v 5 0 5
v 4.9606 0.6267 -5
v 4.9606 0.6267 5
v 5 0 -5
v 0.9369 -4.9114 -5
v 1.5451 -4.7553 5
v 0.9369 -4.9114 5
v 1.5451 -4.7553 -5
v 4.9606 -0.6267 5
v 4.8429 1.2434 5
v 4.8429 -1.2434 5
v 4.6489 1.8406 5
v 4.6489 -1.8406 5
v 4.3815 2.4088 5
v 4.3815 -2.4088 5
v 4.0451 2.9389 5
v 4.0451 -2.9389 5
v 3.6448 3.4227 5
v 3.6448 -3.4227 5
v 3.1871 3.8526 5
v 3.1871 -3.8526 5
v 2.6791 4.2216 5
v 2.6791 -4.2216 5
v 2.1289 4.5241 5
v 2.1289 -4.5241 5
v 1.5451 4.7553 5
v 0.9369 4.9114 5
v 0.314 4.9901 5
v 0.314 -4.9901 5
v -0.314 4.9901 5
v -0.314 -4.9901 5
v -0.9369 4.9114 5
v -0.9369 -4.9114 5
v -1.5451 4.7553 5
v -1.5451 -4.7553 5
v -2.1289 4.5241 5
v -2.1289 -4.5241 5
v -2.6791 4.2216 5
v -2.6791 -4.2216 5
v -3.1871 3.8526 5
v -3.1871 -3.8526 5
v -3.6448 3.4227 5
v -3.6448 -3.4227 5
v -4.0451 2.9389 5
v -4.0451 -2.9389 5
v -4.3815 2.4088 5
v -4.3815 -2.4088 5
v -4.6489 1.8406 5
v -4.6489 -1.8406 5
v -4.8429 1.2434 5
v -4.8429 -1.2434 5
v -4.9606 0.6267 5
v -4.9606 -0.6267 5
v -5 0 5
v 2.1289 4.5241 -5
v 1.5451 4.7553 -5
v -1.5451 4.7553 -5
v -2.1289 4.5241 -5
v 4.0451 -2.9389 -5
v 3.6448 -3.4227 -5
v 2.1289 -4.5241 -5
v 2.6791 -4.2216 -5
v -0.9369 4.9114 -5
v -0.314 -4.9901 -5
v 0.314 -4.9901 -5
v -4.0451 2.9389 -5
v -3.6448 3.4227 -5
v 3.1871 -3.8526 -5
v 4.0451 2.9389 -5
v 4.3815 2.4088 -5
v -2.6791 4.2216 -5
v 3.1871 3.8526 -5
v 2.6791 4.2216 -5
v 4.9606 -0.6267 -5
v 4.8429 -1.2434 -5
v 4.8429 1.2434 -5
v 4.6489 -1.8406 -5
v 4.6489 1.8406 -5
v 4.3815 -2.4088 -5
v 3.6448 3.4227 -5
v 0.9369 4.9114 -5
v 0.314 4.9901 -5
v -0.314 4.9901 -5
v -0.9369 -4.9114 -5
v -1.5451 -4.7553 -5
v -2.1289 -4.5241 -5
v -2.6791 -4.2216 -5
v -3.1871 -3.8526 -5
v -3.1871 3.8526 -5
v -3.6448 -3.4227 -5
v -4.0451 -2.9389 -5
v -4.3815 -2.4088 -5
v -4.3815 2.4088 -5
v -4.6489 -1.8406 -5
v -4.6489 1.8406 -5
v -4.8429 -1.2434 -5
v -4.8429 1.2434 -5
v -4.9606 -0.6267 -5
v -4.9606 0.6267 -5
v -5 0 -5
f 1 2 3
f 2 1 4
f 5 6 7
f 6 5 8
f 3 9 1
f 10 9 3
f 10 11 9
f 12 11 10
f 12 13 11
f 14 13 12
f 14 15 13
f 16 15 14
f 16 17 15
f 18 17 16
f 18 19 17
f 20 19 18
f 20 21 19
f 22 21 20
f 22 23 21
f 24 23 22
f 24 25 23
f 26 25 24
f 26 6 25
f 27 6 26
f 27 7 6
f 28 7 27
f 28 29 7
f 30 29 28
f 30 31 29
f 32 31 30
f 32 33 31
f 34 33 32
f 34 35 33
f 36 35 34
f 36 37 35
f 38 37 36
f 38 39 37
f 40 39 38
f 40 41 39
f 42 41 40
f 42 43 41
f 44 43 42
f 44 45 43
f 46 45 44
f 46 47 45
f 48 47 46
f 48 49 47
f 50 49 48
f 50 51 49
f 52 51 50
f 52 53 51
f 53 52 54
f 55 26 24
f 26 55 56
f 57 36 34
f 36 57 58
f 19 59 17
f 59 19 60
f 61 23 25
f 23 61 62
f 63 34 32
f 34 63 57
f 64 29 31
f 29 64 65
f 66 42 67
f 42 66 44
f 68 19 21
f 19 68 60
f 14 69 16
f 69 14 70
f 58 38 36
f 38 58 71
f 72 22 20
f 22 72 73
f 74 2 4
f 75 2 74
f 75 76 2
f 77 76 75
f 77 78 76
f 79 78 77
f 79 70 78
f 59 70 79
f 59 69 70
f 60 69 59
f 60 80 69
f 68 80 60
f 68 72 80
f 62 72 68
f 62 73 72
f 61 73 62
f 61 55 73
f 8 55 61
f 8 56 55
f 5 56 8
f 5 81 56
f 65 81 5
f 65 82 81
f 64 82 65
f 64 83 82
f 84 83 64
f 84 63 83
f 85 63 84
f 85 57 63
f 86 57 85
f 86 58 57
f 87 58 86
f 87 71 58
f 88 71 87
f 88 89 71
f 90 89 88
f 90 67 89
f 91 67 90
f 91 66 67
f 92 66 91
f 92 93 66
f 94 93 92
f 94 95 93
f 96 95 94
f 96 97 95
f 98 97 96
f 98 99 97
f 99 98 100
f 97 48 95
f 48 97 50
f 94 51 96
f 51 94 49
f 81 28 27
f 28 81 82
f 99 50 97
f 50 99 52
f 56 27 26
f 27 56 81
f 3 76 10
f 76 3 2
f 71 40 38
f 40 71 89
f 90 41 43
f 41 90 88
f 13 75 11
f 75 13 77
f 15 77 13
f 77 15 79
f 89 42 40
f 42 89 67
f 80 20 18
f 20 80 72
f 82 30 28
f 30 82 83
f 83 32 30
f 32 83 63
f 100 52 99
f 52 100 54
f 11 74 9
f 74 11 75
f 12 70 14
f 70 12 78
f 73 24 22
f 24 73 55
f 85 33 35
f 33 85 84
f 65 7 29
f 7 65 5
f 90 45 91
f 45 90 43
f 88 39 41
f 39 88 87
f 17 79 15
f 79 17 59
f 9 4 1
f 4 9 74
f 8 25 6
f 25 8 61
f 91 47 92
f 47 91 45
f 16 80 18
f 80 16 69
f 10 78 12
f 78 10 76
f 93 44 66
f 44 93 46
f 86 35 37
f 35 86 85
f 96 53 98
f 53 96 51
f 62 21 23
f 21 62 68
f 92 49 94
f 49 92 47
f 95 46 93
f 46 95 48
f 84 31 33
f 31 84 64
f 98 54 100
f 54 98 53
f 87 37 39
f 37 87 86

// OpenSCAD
$fn = 50;


difference() {
	union() {
		translate(v = [0, 0, -5.0000000000]) {
			cylinder(h = 10, r = 5);
		}
	}
	union();
}
